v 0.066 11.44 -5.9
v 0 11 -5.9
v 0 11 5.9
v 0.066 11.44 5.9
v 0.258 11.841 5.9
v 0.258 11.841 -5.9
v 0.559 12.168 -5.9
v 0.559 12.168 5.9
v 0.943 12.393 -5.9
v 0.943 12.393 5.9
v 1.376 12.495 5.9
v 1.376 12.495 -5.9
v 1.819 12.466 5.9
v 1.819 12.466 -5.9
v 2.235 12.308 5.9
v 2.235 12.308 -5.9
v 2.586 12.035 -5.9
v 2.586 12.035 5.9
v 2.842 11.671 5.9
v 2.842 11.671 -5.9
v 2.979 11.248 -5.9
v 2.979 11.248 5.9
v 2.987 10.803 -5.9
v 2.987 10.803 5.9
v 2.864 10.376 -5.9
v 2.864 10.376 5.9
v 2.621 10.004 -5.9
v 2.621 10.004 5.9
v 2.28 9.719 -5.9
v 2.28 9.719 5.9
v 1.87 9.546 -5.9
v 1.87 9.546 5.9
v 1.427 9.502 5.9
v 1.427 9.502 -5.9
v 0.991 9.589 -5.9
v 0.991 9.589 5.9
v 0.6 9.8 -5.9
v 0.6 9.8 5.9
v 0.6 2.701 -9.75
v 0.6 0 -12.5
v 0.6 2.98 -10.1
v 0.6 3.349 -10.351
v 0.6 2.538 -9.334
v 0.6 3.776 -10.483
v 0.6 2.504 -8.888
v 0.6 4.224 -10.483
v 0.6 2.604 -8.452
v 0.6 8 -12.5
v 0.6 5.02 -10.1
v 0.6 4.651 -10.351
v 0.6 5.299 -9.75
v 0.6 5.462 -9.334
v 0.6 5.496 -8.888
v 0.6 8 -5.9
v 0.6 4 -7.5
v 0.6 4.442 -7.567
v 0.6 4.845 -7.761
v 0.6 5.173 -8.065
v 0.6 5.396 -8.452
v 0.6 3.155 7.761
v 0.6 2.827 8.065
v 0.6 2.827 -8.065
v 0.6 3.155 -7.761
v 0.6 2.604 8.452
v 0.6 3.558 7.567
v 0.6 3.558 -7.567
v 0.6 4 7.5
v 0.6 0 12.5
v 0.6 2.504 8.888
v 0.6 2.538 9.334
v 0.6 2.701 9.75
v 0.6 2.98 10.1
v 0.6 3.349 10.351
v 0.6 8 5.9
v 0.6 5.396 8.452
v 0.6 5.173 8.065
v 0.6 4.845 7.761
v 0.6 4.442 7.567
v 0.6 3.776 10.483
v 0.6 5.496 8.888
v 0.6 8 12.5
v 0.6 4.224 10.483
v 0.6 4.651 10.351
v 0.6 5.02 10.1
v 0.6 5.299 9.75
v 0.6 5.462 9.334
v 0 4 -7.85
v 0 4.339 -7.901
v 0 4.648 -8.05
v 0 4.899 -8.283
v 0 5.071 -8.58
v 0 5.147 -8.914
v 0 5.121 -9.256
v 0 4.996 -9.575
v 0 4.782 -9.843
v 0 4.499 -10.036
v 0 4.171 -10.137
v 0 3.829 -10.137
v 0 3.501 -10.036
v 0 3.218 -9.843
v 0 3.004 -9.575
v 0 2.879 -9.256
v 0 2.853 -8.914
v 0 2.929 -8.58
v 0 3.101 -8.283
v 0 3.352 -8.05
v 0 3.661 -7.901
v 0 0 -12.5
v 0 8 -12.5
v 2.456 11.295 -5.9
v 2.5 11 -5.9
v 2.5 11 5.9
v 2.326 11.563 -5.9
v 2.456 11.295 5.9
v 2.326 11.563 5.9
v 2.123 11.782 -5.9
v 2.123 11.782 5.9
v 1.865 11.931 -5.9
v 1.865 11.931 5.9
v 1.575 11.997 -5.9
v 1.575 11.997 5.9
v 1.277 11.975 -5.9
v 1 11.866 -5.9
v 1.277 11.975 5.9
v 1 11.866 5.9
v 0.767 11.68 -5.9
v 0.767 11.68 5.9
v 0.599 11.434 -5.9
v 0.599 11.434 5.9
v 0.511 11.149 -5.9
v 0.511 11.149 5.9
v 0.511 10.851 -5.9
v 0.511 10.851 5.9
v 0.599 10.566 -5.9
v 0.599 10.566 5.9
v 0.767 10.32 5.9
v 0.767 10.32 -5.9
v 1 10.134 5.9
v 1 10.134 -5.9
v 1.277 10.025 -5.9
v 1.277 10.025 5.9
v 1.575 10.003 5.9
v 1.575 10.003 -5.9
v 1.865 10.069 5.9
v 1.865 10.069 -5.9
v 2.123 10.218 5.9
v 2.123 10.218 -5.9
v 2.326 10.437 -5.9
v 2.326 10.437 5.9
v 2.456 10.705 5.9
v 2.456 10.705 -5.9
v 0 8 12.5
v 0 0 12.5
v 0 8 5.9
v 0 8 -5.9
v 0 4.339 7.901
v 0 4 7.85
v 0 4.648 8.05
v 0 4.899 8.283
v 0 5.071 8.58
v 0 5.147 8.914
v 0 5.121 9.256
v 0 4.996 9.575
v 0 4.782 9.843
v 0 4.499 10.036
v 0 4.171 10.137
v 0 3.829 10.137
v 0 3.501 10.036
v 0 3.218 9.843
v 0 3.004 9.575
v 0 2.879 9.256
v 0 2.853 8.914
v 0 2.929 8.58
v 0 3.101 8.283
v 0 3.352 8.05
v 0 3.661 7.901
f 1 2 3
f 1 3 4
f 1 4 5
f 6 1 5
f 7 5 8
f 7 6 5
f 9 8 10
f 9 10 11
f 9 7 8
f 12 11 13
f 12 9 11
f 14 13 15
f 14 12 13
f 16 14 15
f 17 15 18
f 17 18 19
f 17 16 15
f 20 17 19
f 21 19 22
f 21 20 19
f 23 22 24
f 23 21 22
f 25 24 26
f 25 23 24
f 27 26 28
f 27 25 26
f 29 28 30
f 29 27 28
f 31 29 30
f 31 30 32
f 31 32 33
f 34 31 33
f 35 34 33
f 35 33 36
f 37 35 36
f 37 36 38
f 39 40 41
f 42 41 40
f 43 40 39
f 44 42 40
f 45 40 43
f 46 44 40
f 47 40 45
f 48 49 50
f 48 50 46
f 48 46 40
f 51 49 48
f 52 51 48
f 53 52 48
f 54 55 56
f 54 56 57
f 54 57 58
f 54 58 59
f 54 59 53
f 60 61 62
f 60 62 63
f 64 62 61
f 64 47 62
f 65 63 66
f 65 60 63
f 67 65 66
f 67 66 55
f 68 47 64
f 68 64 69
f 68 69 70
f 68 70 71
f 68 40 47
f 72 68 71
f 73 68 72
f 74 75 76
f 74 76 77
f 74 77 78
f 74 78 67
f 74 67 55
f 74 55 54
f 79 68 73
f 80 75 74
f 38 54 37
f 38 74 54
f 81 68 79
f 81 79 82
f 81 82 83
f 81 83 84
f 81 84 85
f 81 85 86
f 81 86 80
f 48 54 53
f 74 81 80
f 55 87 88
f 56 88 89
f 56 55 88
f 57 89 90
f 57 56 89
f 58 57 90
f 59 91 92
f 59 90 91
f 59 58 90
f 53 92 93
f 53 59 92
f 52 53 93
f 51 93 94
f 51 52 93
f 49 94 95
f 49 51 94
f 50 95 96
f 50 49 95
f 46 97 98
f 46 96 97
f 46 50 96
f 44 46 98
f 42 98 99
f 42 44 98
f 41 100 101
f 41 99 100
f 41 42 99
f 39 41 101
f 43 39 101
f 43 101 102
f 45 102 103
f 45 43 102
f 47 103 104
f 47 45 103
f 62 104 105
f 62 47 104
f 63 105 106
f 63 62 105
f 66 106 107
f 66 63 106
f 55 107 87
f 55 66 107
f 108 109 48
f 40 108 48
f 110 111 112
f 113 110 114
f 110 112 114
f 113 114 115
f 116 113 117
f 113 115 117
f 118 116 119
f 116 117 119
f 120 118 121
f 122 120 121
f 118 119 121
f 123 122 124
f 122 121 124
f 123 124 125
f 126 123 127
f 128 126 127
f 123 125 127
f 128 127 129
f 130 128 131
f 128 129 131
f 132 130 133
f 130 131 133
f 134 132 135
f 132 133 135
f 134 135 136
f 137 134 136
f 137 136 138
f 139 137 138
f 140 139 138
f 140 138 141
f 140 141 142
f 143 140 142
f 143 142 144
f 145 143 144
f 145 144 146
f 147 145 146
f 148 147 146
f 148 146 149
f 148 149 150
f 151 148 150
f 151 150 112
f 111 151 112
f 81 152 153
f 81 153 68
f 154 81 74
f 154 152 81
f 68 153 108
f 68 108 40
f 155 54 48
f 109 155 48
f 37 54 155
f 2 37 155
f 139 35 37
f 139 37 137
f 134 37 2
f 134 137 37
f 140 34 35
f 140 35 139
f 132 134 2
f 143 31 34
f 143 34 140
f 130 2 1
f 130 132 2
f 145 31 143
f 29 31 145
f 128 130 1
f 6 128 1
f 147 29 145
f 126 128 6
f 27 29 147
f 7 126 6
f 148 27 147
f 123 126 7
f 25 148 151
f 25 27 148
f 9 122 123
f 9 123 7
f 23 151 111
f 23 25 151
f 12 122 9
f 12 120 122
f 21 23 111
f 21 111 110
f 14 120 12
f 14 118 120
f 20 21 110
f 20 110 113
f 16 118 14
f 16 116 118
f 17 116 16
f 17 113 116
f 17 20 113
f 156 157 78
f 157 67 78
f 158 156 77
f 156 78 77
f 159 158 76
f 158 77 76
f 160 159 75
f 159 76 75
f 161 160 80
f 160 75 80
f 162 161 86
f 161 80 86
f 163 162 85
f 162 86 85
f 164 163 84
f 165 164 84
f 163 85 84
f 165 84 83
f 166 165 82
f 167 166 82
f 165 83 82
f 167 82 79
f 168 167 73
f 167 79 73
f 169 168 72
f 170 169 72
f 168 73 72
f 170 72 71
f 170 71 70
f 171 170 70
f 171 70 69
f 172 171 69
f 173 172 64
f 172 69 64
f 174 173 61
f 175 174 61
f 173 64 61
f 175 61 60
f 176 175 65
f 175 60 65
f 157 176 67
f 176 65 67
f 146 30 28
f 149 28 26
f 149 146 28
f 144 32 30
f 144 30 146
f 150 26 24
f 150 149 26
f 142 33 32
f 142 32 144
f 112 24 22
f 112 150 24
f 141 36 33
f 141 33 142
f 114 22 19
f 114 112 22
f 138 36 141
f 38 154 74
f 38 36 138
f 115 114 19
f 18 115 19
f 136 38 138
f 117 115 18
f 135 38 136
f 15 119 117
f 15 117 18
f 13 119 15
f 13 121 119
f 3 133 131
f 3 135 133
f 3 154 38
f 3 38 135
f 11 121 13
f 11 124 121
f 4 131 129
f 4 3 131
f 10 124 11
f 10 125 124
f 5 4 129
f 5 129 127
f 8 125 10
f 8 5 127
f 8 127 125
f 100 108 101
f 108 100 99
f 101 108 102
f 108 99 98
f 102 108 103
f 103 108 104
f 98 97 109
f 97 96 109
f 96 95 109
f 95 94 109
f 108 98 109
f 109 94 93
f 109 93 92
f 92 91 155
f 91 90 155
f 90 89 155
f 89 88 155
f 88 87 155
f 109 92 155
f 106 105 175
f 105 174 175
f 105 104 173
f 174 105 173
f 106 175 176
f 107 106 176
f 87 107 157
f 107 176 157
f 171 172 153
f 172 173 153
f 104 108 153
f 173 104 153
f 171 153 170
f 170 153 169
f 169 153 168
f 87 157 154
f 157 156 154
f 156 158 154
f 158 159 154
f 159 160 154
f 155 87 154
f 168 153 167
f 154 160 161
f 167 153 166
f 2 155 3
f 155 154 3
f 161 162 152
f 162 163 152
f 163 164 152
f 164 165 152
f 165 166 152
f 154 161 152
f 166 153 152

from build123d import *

# Parameters (mm, degrees)
SKETCH_1_W          = 0.6
SKETCH_1_H          = 11
EXTRUDE_1_DEPTH     = 12.5
SKETCH_2_R          = 1.5
SKETCH_3_R          = 1
CUT_EXTRUDE_1_DEPTH = 29.111385594
SKETCH_10_W         = 7.870368163
SKETCH_10_H         = 6
CUT_EXTRUDE_4_DEPTH = 60
SKETCH_12_R         = 1.15
SKETCH_11_R         = 1.5


with BuildPart() as part:
    # 草图1 → 拉伸-薄壁1 (new, symmetric)
    with BuildSketch(Plane.XY):
        with Locations((0.3, 5.5)):
            Rectangle(SKETCH_1_W, SKETCH_1_H)
    extrude(amount=EXTRUDE_1_DEPTH, both=True)

    # 扫描1: sweep along a curve in space
    with BuildLine() as sweep_1_path:
        Line((0.6, 11, 12.5), (0.6, 11, -12.5))
    # 草图2 → 扫描1 (sweep)
    with BuildSketch(Plane.XY.offset(12.5)):
        with Locations((1.5, 11)):
            Circle(SKETCH_2_R)
    sweep(path=sweep_1_path.line)

    # 草图3 → 切除-拉伸1 (cut, through all)
    with BuildSketch(Plane.XY.offset(12.5)):
        with Locations((1.5, 11)):
            Circle(SKETCH_3_R)
    extrude(amount=-CUT_EXTRUDE_1_DEPTH, mode=Mode.SUBTRACT)

    # 草图10 → 切除-拉伸4 (cut, symmetric)
    with BuildSketch(Plane(origin=(0.6, 0, 0), x_dir=(0, 0, -1), z_dir=(1, 0, 0))):
        with Locations((-9.835184081, 11)):
            Rectangle(SKETCH_10_W, SKETCH_10_H)
        with Locations((9.835184081, 11)):
            Rectangle(SKETCH_10_W, SKETCH_10_H)
    extrude(amount=CUT_EXTRUDE_4_DEPTH, both=True, mode=Mode.SUBTRACT)

    # 草图12 → 切除-放样1 section 0
    with BuildSketch(Plane.ZY):
        with Locations((-9, 4)):
            Circle(SKETCH_12_R)
    # 草图11 → 切除-放样1 section 1
    with BuildSketch(Plane(origin=(0.6, 0, 0), x_dir=(0, 0, -1), z_dir=(1, 0, 0))):
        with Locations((9, 4)):
            Circle(SKETCH_11_R)
    loft_1 = loft(mode=Mode.SUBTRACT)

    # 镜向1: 切除-放样1 across plane
    add(loft_1.mirror(Plane.XY), mode=Mode.SUBTRACT)


solid = part.part
